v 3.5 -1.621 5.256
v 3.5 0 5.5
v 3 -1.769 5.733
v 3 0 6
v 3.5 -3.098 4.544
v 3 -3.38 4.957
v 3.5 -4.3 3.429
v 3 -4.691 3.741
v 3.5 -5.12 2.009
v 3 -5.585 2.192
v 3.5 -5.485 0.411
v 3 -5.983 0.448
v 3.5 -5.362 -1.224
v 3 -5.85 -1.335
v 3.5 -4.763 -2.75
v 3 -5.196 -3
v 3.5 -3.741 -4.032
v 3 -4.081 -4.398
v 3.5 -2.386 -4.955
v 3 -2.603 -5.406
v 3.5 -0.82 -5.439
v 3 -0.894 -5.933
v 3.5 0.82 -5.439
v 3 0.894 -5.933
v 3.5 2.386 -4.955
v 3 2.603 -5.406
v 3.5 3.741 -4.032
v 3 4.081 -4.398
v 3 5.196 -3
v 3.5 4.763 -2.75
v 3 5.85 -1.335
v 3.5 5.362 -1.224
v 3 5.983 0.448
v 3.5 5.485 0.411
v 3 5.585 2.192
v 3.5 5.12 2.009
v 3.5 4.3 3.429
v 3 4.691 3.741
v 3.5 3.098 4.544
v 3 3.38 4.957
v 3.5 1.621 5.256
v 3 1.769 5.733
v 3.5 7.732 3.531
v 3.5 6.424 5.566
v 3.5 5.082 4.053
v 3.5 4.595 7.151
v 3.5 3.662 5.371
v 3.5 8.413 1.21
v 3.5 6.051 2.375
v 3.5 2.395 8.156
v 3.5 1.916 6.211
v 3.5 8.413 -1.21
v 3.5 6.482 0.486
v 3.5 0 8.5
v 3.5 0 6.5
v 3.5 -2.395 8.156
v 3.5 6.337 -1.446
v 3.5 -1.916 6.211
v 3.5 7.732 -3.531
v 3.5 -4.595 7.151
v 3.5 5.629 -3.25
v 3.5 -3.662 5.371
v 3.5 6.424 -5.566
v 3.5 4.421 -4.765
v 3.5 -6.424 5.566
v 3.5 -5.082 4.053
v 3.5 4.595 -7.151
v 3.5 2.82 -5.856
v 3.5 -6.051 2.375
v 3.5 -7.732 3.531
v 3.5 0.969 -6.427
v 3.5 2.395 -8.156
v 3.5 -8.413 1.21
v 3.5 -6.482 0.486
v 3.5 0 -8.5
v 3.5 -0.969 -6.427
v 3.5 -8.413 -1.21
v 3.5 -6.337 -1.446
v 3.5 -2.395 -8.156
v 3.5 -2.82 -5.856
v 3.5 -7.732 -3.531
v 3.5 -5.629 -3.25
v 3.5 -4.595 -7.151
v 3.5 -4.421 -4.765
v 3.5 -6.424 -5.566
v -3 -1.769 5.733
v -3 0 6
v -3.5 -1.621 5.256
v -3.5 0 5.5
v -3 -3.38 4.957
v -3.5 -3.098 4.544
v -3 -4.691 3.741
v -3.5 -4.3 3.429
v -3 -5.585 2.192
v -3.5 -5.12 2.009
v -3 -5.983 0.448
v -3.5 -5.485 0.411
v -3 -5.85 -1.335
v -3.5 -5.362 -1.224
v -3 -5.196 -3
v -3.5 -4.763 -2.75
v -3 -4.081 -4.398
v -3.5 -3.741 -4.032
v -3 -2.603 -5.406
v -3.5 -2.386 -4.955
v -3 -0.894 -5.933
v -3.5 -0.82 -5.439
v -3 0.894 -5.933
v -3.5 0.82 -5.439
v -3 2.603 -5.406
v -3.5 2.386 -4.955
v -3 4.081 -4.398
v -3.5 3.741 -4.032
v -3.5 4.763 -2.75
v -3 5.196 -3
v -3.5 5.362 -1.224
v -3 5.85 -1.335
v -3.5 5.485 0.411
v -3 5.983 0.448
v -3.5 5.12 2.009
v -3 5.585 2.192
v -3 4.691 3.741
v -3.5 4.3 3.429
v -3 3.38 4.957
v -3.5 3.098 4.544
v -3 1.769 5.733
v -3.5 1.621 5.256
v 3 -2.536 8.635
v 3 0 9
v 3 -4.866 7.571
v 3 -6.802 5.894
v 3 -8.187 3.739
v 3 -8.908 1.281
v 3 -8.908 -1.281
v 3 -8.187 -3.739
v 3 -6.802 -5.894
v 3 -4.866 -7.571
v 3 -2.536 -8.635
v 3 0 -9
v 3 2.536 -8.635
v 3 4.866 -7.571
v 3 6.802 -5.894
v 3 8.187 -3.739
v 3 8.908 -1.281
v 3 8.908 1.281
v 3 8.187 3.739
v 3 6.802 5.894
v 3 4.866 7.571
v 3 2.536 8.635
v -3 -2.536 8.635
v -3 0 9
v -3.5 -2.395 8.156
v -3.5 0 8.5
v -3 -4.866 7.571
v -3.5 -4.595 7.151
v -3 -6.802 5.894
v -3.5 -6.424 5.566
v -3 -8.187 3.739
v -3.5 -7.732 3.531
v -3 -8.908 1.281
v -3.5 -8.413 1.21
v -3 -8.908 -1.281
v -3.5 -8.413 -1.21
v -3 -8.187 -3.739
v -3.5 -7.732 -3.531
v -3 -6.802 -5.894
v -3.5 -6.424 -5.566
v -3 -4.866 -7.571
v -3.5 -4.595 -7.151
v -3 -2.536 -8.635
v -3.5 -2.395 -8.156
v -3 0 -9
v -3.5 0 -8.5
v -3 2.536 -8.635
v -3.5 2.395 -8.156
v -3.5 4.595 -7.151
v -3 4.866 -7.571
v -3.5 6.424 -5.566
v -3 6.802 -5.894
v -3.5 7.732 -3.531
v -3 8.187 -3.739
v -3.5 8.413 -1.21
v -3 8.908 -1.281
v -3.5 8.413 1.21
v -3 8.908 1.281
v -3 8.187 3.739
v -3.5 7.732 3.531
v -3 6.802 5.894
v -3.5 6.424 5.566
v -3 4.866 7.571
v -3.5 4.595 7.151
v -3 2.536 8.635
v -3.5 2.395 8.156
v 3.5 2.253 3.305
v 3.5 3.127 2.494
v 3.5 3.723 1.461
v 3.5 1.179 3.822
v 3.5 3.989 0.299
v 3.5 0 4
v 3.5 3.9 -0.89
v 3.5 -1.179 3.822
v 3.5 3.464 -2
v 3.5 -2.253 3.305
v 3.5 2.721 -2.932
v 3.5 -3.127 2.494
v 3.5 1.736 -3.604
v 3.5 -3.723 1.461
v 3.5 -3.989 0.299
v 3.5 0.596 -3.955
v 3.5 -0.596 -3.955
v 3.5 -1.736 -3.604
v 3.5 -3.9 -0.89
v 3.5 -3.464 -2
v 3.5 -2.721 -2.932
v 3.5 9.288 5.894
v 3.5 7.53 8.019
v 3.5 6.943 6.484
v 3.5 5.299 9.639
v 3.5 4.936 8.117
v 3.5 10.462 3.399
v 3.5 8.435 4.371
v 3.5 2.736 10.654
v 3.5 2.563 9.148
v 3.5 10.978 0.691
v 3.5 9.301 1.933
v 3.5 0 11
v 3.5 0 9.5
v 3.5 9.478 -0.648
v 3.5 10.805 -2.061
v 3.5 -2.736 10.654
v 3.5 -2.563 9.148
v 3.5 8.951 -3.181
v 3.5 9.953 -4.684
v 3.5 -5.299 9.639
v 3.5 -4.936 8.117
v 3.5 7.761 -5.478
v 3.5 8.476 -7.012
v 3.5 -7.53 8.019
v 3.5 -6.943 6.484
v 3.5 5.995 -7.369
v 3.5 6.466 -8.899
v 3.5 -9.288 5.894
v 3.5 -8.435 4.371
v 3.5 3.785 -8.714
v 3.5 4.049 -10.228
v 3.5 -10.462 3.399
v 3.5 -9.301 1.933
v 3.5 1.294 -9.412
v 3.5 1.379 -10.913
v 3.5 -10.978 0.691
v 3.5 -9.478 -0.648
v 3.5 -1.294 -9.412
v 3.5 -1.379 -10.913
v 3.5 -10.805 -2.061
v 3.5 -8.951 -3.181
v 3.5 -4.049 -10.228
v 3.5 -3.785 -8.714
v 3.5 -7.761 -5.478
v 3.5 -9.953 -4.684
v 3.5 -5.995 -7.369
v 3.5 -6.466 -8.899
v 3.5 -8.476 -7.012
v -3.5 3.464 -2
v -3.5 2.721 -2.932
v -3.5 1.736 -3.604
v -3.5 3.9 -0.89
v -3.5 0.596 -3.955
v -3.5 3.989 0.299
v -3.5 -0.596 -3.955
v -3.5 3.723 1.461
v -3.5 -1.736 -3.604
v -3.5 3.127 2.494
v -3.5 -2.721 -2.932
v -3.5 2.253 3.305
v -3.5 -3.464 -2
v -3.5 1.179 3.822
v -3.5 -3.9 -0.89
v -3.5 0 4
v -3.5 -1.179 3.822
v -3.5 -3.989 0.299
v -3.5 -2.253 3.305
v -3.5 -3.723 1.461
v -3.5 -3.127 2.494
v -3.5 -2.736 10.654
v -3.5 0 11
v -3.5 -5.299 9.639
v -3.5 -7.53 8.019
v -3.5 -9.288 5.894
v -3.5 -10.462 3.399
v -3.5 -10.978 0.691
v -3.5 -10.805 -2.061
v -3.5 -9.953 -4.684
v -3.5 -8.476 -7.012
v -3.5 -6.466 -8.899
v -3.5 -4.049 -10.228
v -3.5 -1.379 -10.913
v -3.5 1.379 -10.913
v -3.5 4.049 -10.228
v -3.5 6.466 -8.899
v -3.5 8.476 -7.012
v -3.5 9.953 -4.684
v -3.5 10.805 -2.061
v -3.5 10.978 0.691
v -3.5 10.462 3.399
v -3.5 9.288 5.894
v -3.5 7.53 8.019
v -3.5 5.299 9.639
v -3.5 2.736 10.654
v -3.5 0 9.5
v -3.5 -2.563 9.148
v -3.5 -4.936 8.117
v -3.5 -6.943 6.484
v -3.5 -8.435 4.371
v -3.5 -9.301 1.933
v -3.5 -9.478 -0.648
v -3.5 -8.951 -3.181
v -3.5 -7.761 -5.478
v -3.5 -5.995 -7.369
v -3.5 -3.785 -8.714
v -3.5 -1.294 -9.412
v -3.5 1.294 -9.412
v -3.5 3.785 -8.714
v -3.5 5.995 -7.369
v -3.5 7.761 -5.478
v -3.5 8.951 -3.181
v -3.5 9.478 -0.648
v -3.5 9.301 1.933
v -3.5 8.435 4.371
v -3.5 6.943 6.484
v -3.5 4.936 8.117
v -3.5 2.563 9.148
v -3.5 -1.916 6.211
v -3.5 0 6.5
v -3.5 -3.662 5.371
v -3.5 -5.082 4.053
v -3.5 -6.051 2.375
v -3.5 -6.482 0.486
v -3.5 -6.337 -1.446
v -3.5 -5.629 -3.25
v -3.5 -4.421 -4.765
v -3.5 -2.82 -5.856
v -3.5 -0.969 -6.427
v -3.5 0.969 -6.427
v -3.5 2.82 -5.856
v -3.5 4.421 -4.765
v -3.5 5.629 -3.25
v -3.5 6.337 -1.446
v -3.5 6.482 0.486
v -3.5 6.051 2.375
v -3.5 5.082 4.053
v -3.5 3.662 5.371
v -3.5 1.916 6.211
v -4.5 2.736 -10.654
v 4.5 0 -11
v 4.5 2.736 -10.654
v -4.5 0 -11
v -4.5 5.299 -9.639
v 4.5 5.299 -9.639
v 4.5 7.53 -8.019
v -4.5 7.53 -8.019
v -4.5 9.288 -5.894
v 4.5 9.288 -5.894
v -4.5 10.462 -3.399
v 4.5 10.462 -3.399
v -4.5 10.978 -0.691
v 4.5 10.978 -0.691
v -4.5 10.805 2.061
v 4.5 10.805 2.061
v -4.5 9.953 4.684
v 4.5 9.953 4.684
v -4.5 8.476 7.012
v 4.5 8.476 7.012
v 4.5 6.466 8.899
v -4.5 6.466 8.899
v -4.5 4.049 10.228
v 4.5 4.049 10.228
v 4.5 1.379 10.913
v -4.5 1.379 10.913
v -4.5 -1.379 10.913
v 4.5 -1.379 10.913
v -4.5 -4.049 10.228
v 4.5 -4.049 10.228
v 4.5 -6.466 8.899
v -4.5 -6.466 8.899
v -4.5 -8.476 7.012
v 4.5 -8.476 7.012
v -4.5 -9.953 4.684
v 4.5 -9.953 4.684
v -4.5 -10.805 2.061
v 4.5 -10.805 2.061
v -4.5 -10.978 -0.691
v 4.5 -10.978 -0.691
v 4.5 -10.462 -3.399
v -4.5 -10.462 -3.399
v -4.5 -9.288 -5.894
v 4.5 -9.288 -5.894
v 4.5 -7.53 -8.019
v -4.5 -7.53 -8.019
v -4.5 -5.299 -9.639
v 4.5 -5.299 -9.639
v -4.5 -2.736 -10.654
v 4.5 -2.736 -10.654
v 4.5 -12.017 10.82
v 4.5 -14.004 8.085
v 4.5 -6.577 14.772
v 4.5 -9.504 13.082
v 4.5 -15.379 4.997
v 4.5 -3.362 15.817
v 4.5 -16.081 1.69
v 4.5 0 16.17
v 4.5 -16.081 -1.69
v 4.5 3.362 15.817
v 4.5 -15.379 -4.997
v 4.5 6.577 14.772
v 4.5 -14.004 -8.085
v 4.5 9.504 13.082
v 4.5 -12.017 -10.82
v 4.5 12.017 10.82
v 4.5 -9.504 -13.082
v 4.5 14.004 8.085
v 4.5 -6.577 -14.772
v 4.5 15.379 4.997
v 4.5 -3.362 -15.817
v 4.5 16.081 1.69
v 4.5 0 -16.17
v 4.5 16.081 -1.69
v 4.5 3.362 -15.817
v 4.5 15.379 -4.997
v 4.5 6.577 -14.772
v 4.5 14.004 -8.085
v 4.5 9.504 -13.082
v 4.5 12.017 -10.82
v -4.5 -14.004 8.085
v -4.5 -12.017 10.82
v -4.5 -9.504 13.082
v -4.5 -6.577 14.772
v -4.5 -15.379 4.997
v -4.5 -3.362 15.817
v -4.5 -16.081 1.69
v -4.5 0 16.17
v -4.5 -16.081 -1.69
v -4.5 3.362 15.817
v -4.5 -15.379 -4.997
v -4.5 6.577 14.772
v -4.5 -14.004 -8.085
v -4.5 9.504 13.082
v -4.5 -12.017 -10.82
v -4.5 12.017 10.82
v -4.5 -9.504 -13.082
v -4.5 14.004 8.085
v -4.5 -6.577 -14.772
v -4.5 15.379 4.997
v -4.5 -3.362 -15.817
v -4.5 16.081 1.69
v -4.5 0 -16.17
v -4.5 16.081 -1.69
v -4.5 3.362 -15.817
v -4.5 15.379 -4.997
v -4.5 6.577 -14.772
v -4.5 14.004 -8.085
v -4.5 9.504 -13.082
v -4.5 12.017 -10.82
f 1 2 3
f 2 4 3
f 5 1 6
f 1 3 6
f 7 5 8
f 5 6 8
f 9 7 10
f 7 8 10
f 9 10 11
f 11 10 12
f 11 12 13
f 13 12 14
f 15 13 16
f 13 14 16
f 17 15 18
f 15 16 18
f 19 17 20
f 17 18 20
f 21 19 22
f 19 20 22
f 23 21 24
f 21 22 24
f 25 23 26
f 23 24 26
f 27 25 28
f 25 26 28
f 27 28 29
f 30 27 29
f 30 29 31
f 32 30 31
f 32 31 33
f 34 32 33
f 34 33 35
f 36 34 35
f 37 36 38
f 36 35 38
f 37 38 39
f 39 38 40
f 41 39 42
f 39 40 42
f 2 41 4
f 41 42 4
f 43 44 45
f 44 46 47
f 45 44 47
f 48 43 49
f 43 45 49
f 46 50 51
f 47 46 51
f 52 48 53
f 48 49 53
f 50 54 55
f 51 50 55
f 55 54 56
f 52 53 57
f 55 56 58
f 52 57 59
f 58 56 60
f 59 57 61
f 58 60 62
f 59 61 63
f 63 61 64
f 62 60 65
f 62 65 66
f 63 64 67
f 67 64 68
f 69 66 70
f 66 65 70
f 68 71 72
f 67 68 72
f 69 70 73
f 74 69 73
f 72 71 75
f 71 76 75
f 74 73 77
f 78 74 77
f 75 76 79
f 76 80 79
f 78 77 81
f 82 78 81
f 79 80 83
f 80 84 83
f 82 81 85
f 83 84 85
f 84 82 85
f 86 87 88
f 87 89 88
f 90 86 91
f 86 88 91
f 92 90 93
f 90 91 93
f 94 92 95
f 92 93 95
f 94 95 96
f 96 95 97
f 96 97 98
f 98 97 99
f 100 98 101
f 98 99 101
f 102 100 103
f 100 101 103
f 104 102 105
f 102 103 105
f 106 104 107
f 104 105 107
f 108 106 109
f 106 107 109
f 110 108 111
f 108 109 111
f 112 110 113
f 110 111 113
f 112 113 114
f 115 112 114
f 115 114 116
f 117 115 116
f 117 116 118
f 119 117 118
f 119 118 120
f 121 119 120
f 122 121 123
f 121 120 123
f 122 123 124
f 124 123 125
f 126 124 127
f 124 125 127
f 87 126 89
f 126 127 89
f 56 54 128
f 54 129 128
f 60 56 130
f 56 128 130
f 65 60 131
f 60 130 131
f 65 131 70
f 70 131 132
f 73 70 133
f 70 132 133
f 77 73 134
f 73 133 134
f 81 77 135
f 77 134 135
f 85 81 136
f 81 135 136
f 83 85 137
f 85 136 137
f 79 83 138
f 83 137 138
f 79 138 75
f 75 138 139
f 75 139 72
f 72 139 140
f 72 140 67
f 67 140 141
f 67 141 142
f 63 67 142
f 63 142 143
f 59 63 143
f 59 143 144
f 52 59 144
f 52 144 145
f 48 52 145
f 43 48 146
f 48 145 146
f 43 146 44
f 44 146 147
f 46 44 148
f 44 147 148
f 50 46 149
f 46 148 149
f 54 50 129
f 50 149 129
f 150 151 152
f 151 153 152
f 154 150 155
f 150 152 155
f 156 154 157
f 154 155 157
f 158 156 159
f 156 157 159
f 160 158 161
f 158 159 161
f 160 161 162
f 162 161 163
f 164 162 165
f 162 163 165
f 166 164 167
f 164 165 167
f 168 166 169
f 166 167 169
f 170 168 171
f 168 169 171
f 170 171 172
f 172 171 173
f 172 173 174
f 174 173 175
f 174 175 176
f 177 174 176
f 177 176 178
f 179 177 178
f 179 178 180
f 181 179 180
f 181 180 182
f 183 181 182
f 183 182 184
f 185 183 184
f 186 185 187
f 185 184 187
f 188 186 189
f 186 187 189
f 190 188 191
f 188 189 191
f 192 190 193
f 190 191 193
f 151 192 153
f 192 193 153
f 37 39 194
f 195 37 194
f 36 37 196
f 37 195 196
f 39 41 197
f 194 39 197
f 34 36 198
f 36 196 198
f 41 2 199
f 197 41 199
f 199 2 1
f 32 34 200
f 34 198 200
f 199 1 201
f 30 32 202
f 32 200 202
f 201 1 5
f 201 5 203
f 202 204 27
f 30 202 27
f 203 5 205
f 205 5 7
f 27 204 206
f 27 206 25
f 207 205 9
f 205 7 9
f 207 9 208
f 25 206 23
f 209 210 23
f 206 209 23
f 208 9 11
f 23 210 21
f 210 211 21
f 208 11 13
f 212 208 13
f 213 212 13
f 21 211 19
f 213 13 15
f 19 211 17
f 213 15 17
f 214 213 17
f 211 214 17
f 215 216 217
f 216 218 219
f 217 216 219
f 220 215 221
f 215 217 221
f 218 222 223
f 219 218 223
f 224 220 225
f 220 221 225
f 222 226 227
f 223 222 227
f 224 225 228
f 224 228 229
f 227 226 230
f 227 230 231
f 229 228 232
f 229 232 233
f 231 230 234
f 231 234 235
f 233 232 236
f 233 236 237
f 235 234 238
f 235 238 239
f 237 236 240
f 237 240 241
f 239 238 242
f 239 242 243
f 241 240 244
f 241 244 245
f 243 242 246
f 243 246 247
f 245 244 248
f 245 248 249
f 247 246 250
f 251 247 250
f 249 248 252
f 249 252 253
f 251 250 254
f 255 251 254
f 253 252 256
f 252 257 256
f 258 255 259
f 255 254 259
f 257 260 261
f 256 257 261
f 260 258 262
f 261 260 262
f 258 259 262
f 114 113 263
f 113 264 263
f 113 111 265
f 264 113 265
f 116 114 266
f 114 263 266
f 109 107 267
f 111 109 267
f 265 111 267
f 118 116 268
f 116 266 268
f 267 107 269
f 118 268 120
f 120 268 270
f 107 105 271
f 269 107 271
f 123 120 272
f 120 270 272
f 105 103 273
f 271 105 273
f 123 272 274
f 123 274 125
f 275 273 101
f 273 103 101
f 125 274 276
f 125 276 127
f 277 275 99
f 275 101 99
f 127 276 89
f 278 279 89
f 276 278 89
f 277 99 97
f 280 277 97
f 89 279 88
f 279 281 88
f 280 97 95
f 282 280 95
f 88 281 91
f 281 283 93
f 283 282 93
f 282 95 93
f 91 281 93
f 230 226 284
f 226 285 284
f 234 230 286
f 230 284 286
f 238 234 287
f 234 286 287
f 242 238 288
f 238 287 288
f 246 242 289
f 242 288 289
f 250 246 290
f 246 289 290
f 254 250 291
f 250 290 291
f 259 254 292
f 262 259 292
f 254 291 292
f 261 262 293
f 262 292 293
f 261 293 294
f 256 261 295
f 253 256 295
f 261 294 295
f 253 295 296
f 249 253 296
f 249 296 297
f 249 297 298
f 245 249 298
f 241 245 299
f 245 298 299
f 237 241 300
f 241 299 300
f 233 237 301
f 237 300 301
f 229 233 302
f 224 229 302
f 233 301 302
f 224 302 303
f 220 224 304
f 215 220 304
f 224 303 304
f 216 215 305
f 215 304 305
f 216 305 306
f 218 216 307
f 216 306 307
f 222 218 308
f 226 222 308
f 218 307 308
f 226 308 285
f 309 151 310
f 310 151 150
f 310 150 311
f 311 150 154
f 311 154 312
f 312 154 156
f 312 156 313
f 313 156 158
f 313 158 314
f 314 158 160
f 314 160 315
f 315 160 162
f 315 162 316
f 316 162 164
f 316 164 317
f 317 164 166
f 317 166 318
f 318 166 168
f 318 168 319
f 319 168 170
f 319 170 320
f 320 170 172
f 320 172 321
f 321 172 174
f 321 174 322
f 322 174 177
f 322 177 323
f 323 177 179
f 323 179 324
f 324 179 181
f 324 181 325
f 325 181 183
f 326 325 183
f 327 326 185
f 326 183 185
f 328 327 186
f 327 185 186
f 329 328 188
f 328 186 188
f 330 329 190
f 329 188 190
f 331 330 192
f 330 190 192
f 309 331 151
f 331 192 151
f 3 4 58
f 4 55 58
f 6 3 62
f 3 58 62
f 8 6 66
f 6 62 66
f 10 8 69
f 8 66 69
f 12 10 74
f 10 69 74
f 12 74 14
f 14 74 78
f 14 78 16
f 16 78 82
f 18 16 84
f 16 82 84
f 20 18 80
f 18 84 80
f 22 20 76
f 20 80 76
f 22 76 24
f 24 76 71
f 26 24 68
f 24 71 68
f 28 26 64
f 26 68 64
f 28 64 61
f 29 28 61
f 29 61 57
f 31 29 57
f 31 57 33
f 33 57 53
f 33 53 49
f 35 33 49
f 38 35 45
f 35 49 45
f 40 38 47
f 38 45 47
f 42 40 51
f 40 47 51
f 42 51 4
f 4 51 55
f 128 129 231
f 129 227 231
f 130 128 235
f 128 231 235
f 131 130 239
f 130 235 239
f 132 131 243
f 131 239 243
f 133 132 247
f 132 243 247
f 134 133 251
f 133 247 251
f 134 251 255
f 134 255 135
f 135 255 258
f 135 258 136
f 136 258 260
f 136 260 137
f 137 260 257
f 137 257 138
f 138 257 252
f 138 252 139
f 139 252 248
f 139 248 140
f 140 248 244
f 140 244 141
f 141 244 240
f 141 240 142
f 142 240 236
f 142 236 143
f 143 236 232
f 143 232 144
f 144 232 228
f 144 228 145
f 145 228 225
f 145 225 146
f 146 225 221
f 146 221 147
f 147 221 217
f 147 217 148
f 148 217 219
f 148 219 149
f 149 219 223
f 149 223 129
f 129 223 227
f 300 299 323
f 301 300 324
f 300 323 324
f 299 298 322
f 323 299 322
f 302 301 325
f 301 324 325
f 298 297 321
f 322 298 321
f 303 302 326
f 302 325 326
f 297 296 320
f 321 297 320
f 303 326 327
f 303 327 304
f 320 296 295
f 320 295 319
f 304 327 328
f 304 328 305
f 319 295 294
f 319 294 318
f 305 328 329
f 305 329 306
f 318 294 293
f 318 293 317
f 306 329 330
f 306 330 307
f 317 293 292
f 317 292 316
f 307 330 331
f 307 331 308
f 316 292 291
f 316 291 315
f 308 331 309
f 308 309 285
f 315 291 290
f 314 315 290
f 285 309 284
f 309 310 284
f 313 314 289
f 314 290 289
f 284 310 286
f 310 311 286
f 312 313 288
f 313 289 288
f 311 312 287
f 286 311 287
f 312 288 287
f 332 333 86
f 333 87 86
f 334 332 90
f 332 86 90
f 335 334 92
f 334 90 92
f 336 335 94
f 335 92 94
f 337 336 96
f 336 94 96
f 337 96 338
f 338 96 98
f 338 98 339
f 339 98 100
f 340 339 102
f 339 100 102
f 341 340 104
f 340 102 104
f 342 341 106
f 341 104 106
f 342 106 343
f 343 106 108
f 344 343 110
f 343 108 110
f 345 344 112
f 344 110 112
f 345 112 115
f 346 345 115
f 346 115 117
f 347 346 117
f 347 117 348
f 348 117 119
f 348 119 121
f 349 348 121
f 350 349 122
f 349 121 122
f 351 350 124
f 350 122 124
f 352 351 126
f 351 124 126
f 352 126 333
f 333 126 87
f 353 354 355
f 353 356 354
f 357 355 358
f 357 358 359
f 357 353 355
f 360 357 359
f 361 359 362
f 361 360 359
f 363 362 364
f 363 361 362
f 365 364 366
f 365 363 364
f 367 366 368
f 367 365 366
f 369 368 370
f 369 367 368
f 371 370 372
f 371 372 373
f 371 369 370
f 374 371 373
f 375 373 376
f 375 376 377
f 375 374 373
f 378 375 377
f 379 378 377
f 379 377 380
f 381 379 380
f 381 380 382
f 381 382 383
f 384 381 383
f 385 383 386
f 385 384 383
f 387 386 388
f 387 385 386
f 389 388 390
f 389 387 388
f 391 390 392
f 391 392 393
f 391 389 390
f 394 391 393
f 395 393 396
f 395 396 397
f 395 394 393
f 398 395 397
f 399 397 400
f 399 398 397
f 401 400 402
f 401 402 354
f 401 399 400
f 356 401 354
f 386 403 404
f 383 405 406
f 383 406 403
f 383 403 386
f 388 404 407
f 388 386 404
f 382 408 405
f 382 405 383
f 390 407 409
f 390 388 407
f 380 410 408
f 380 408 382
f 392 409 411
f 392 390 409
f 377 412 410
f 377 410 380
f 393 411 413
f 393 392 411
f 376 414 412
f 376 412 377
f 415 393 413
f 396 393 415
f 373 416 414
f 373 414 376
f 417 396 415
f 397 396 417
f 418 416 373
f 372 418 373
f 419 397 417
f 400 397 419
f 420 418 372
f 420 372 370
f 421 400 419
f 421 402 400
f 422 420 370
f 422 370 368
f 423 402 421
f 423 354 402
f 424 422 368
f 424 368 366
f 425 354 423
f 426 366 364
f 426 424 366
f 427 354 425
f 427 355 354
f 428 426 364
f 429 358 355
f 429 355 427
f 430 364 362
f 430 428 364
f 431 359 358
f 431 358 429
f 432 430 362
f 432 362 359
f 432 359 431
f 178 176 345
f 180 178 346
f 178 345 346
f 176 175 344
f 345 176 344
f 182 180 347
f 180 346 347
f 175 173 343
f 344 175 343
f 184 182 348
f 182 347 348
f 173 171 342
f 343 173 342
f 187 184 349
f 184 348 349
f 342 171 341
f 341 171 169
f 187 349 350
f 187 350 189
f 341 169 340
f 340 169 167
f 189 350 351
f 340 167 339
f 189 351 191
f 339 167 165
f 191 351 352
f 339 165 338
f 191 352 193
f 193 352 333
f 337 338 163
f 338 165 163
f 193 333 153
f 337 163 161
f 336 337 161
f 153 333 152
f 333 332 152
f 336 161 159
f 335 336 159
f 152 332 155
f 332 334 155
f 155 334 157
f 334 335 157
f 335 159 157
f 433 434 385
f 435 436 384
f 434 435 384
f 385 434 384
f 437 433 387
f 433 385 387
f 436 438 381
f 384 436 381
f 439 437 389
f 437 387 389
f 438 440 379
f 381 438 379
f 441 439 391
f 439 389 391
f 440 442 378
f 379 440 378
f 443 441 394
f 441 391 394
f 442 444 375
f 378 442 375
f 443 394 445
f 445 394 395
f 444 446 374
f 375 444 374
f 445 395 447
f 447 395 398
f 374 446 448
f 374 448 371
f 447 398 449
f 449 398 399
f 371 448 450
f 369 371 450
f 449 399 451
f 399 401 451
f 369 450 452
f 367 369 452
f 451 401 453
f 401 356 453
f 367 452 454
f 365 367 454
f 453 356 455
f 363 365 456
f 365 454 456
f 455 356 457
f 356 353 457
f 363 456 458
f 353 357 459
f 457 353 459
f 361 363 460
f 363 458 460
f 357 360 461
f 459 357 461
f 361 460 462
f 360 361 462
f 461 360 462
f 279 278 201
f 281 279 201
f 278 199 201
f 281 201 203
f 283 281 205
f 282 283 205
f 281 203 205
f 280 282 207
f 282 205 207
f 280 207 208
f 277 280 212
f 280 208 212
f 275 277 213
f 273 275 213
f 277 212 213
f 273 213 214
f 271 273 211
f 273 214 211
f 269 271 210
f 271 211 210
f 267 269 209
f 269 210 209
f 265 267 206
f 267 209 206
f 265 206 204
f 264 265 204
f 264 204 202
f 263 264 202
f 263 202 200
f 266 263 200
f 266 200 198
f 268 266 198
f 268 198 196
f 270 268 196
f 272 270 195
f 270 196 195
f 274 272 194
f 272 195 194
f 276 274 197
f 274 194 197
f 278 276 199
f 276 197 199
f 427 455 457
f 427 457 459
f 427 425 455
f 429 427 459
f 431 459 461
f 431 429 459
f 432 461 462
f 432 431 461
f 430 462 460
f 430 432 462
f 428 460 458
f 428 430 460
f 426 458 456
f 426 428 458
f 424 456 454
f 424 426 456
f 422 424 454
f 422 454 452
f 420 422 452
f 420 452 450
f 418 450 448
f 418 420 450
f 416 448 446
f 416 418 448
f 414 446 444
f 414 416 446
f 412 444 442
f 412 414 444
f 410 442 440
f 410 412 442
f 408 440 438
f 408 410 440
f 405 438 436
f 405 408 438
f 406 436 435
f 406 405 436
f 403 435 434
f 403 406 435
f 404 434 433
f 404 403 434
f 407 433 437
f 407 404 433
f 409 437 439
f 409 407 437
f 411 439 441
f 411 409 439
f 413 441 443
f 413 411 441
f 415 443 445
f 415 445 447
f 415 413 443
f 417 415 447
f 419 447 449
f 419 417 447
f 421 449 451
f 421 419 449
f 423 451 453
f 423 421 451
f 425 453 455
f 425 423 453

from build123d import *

# Parameters (mm, degrees)
ESQUISSE2_R        = 16.17
ESQUISSE2_R_2      = 11
BOSS_EXTRU_1_DEPTH = 4.5


with BuildPart() as part:
    # Esquisse1 → Base-Révolution (revolve)
    with BuildSketch(Plane.XY, mode=Mode.PRIVATE) as base_r_volution_sk:
        Polygon((-3.5, 4), (3.5, 4), (3.5, 5.5), (3, 6), (3.5, 6.5), (3.5, 8.5), (3, 9), (3.5, 9.5), (3.5, 11), (-3.5, 11), (-3.5, 9.5), (-3, 9), (-3.5, 8.5), (-3.5, 6.5), (-3, 6), (-3.5, 5.5), align=None)
    revolve(base_r_volution_sk.sketch.rotate(Axis((0, 0, 0), (1, 0, 0)), 90), axis=Axis((0, 0, 0), (1, 0, 0)))


with BuildPart() as body_2:
    # Esquisse2 → Boss.-Extru.1 (new, symmetric)
    with BuildSketch(Plane(origin=(0, 0, 0), x_dir=(0, 0, -1), z_dir=(1, 0, 0))):
        Circle(ESQUISSE2_R)
        Circle(ESQUISSE2_R_2, mode=Mode.SUBTRACT)
    extrude(amount=BOSS_EXTRU_1_DEPTH, both=True)


solid = Compound([part.part, body_2.part])
